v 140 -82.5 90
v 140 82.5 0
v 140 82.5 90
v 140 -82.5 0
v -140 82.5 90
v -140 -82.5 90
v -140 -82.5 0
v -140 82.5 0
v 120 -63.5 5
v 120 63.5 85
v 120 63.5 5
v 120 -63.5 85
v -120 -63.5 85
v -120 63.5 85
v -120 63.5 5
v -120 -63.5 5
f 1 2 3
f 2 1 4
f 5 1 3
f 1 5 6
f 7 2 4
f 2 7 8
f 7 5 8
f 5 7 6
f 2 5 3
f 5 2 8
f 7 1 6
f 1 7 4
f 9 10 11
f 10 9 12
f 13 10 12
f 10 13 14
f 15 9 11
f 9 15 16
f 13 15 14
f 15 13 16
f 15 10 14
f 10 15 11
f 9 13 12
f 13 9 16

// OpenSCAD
outer_w=280; outer_d=165; outer_h=90;
inner_w=240; inner_d=127; inner_h=80; bottom_wall=5;
module shell(){ translate([-outer_w/2,-outer_d/2,0]) cube([outer_w,outer_d,outer_h]); }
module hollow(){ translate([-inner_w/2,-inner_d/2,bottom_wall]) cube([inner_w,inner_d,inner_h]); }
difference(){ shell(); hollow(); }
